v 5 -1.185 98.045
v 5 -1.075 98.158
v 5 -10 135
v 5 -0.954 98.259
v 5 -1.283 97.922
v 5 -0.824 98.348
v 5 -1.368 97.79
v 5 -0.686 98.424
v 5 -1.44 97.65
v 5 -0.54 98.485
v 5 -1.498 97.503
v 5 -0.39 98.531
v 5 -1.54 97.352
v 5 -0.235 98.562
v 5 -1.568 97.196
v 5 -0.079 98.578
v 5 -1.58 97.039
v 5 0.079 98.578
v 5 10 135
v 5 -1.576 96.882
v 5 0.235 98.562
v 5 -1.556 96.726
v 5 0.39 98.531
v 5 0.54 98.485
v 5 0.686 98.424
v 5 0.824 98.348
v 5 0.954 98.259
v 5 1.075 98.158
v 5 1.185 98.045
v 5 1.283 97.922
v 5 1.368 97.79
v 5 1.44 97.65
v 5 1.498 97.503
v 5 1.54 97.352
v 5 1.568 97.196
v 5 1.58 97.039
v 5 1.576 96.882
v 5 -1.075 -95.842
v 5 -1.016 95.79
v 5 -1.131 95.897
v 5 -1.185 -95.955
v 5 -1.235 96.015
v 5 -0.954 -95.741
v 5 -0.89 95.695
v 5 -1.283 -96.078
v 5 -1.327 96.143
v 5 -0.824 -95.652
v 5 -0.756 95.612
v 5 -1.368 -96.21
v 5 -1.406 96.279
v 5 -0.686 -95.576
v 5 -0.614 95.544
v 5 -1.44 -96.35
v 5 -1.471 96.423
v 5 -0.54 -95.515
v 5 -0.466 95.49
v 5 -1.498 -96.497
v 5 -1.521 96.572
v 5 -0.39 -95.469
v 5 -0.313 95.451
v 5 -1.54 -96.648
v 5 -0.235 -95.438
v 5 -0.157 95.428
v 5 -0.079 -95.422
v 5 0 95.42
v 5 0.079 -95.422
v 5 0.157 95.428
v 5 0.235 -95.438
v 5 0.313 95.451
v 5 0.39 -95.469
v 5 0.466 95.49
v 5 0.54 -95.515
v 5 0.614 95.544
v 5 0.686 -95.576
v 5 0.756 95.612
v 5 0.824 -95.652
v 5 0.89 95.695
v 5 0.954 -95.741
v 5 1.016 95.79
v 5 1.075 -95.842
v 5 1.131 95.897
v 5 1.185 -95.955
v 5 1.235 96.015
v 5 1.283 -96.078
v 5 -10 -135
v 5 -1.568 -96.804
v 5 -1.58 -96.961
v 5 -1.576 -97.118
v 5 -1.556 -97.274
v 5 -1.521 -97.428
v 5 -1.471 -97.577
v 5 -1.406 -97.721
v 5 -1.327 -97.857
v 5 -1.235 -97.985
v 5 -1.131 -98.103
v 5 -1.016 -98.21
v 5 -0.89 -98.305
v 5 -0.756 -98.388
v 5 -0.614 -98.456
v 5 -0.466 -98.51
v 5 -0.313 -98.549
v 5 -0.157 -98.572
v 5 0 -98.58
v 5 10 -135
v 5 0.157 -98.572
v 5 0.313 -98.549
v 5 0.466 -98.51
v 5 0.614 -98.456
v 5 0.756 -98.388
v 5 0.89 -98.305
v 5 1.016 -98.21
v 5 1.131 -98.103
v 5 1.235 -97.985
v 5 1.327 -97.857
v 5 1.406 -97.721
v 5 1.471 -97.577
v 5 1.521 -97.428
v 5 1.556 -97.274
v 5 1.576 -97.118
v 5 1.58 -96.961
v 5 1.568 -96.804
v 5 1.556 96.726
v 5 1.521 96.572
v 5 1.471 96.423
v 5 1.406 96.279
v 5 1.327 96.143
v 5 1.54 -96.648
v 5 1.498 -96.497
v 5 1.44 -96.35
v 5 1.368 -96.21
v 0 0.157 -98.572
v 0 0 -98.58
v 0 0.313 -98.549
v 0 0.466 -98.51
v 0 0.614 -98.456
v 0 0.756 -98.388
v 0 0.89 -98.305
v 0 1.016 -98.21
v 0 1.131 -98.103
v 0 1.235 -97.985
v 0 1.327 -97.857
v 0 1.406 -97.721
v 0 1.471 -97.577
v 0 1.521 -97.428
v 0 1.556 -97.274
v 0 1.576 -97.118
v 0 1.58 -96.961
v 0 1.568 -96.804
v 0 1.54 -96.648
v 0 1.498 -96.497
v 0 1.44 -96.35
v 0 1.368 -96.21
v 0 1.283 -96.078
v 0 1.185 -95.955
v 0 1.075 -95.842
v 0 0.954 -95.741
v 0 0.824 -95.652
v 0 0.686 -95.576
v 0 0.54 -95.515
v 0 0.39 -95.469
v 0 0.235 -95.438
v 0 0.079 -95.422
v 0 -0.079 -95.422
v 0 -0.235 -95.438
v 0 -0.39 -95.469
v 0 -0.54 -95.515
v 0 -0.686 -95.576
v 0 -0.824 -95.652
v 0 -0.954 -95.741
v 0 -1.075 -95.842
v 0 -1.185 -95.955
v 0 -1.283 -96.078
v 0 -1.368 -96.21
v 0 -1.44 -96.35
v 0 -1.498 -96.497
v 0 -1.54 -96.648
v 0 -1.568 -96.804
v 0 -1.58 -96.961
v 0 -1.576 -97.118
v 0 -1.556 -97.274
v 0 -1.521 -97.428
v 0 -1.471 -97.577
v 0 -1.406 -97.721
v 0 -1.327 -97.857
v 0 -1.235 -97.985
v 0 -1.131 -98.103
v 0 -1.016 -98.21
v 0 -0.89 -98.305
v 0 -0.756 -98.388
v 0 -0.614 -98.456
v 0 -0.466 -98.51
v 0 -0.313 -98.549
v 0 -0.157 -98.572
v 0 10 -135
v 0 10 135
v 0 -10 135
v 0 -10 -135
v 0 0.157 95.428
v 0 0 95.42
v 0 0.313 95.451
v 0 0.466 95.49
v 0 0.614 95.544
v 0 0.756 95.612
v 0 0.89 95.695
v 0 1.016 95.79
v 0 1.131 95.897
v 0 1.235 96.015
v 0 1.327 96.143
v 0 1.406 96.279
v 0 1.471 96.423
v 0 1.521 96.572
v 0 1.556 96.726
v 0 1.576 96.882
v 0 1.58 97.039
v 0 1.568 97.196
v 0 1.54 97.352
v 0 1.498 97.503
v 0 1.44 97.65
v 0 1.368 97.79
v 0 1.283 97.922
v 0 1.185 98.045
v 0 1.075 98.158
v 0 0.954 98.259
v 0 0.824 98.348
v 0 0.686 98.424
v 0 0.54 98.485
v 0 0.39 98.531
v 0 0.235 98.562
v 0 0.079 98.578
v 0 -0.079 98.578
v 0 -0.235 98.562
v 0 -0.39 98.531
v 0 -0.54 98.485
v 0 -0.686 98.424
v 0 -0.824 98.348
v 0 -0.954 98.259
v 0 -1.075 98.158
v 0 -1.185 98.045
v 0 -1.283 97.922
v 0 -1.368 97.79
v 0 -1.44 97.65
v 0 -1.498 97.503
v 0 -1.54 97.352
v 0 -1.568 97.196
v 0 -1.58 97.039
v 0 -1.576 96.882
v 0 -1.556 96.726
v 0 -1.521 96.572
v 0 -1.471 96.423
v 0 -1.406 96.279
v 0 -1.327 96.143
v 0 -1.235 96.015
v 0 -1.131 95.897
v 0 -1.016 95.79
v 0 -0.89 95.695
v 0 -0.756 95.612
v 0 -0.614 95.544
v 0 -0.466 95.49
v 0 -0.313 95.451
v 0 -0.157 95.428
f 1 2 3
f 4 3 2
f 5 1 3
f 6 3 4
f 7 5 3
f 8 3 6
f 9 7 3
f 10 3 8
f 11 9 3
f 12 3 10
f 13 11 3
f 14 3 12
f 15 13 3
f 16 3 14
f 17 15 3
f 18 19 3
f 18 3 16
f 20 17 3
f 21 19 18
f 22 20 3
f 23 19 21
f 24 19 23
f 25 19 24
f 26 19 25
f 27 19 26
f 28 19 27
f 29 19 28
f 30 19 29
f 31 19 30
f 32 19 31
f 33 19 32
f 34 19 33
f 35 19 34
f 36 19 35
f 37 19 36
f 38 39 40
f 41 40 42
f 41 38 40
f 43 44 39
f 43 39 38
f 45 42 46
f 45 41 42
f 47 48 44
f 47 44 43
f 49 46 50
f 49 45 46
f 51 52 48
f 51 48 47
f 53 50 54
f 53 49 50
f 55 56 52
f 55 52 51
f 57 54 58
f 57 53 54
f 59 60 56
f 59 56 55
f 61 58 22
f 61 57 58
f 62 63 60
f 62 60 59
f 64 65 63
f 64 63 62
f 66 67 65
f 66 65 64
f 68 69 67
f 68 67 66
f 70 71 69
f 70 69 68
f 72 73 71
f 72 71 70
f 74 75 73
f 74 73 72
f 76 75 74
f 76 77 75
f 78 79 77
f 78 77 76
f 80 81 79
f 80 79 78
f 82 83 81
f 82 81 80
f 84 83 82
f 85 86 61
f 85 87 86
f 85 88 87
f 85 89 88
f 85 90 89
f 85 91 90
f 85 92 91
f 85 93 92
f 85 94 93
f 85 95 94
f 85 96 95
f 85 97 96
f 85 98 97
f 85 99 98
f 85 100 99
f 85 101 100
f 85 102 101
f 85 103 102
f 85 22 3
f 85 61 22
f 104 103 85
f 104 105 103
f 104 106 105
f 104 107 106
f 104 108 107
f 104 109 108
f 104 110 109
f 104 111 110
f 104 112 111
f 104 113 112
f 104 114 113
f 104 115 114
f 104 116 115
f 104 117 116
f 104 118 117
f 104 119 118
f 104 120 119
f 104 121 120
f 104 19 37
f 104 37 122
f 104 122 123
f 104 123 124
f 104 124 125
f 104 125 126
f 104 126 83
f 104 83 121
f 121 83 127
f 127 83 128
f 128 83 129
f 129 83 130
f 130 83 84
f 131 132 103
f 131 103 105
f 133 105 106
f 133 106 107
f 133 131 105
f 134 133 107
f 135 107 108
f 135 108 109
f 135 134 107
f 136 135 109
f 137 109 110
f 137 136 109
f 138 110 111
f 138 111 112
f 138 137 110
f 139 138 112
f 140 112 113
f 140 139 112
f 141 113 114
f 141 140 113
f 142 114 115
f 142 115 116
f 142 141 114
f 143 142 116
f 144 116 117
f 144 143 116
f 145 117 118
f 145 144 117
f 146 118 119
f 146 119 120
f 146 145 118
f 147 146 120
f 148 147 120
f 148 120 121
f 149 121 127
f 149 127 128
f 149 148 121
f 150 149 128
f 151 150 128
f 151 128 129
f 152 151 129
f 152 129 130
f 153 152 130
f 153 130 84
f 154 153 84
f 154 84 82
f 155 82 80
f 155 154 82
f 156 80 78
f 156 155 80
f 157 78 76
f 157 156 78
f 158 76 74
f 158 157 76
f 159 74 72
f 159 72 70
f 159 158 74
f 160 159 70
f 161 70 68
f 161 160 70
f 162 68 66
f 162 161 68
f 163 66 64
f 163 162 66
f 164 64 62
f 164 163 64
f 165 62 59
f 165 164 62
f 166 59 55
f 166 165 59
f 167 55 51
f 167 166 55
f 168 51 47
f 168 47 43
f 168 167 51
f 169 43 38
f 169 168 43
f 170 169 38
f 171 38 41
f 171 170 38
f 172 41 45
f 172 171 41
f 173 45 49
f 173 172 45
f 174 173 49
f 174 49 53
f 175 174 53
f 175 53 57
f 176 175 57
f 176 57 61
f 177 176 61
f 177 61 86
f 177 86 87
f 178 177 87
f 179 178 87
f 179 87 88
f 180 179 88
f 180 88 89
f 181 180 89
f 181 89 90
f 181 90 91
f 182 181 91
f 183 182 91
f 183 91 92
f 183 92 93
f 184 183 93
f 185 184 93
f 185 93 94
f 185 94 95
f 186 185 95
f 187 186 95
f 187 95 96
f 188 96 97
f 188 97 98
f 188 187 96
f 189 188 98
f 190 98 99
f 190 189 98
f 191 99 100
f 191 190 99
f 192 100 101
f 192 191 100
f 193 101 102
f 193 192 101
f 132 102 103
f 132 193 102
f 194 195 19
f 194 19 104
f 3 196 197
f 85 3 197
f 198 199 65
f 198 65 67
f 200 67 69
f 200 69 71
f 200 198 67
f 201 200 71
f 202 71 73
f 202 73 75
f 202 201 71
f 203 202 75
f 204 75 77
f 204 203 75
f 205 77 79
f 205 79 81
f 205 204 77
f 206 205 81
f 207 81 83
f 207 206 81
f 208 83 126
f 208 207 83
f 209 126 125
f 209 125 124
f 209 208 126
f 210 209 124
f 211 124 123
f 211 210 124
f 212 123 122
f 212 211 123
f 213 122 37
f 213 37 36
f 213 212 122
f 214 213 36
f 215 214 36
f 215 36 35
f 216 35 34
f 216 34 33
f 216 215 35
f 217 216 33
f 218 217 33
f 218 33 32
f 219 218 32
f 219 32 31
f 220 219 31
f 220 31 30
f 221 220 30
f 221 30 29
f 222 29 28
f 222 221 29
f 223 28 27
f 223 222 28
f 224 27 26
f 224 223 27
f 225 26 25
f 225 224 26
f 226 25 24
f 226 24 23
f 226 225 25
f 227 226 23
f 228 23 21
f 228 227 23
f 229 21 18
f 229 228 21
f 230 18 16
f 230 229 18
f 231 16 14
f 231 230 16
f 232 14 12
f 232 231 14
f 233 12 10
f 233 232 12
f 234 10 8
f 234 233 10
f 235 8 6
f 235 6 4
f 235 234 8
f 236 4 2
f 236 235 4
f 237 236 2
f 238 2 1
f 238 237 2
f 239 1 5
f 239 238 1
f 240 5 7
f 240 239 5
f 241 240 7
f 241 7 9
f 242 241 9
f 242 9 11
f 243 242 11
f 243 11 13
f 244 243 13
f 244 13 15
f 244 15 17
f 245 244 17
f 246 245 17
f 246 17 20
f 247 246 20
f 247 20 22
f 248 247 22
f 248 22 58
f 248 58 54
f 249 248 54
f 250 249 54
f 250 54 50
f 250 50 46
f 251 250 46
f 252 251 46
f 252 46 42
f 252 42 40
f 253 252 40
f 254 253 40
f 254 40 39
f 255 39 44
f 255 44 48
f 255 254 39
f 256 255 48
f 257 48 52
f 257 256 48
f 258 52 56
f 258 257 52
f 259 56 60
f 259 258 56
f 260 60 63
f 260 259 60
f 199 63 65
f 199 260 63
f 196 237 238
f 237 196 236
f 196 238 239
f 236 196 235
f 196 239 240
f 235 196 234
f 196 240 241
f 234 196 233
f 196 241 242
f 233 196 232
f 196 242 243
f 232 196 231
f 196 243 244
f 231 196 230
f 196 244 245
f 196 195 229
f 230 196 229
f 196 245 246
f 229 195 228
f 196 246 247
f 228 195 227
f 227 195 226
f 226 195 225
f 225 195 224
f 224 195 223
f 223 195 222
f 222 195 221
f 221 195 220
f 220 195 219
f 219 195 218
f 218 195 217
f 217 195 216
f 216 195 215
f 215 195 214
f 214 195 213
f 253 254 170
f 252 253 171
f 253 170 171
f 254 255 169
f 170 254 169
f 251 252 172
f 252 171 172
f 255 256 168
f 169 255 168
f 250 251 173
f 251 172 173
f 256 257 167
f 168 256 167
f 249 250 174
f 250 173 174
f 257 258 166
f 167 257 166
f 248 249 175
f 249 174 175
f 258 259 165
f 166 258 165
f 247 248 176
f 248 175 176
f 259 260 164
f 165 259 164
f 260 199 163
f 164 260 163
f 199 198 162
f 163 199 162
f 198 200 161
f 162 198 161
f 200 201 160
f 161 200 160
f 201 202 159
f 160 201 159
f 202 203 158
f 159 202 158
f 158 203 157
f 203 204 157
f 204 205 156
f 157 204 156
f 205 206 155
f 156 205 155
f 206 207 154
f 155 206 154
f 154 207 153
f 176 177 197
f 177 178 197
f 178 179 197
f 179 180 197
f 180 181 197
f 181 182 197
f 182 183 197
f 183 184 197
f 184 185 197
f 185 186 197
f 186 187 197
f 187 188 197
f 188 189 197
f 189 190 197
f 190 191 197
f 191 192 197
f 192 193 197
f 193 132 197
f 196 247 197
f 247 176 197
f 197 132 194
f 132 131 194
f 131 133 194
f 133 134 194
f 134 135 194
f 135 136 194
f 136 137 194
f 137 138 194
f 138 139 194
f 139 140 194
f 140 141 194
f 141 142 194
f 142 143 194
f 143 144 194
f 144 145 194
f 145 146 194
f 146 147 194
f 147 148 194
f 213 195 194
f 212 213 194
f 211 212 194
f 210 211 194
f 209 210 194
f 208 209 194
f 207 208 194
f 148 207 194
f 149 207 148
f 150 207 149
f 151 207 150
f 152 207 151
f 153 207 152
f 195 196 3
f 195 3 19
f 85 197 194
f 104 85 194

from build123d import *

# Parameters (mm, degrees)
CROQUIS1_W              = 270
CROQUIS1_H              = 20
CROQUIS1_R              = 1.58
SALIENTE_EXTRUIR1_DEPTH = 5


with BuildPart() as part:
    # Croquis1 → Saliente-Extruir1 (new body)
    with BuildSketch(Plane(origin=(0, 0, 0), x_dir=(0, 0, -1), z_dir=(1, 0, 0))):
        Rectangle(CROQUIS1_W, CROQUIS1_H)
        with Locations((97, 0)):
            Circle(CROQUIS1_R, mode=Mode.SUBTRACT)
        with Locations((-97, 0)):
            Circle(CROQUIS1_R, mode=Mode.SUBTRACT)
    extrude(amount=SALIENTE_EXTRUIR1_DEPTH)


solid = part.part
